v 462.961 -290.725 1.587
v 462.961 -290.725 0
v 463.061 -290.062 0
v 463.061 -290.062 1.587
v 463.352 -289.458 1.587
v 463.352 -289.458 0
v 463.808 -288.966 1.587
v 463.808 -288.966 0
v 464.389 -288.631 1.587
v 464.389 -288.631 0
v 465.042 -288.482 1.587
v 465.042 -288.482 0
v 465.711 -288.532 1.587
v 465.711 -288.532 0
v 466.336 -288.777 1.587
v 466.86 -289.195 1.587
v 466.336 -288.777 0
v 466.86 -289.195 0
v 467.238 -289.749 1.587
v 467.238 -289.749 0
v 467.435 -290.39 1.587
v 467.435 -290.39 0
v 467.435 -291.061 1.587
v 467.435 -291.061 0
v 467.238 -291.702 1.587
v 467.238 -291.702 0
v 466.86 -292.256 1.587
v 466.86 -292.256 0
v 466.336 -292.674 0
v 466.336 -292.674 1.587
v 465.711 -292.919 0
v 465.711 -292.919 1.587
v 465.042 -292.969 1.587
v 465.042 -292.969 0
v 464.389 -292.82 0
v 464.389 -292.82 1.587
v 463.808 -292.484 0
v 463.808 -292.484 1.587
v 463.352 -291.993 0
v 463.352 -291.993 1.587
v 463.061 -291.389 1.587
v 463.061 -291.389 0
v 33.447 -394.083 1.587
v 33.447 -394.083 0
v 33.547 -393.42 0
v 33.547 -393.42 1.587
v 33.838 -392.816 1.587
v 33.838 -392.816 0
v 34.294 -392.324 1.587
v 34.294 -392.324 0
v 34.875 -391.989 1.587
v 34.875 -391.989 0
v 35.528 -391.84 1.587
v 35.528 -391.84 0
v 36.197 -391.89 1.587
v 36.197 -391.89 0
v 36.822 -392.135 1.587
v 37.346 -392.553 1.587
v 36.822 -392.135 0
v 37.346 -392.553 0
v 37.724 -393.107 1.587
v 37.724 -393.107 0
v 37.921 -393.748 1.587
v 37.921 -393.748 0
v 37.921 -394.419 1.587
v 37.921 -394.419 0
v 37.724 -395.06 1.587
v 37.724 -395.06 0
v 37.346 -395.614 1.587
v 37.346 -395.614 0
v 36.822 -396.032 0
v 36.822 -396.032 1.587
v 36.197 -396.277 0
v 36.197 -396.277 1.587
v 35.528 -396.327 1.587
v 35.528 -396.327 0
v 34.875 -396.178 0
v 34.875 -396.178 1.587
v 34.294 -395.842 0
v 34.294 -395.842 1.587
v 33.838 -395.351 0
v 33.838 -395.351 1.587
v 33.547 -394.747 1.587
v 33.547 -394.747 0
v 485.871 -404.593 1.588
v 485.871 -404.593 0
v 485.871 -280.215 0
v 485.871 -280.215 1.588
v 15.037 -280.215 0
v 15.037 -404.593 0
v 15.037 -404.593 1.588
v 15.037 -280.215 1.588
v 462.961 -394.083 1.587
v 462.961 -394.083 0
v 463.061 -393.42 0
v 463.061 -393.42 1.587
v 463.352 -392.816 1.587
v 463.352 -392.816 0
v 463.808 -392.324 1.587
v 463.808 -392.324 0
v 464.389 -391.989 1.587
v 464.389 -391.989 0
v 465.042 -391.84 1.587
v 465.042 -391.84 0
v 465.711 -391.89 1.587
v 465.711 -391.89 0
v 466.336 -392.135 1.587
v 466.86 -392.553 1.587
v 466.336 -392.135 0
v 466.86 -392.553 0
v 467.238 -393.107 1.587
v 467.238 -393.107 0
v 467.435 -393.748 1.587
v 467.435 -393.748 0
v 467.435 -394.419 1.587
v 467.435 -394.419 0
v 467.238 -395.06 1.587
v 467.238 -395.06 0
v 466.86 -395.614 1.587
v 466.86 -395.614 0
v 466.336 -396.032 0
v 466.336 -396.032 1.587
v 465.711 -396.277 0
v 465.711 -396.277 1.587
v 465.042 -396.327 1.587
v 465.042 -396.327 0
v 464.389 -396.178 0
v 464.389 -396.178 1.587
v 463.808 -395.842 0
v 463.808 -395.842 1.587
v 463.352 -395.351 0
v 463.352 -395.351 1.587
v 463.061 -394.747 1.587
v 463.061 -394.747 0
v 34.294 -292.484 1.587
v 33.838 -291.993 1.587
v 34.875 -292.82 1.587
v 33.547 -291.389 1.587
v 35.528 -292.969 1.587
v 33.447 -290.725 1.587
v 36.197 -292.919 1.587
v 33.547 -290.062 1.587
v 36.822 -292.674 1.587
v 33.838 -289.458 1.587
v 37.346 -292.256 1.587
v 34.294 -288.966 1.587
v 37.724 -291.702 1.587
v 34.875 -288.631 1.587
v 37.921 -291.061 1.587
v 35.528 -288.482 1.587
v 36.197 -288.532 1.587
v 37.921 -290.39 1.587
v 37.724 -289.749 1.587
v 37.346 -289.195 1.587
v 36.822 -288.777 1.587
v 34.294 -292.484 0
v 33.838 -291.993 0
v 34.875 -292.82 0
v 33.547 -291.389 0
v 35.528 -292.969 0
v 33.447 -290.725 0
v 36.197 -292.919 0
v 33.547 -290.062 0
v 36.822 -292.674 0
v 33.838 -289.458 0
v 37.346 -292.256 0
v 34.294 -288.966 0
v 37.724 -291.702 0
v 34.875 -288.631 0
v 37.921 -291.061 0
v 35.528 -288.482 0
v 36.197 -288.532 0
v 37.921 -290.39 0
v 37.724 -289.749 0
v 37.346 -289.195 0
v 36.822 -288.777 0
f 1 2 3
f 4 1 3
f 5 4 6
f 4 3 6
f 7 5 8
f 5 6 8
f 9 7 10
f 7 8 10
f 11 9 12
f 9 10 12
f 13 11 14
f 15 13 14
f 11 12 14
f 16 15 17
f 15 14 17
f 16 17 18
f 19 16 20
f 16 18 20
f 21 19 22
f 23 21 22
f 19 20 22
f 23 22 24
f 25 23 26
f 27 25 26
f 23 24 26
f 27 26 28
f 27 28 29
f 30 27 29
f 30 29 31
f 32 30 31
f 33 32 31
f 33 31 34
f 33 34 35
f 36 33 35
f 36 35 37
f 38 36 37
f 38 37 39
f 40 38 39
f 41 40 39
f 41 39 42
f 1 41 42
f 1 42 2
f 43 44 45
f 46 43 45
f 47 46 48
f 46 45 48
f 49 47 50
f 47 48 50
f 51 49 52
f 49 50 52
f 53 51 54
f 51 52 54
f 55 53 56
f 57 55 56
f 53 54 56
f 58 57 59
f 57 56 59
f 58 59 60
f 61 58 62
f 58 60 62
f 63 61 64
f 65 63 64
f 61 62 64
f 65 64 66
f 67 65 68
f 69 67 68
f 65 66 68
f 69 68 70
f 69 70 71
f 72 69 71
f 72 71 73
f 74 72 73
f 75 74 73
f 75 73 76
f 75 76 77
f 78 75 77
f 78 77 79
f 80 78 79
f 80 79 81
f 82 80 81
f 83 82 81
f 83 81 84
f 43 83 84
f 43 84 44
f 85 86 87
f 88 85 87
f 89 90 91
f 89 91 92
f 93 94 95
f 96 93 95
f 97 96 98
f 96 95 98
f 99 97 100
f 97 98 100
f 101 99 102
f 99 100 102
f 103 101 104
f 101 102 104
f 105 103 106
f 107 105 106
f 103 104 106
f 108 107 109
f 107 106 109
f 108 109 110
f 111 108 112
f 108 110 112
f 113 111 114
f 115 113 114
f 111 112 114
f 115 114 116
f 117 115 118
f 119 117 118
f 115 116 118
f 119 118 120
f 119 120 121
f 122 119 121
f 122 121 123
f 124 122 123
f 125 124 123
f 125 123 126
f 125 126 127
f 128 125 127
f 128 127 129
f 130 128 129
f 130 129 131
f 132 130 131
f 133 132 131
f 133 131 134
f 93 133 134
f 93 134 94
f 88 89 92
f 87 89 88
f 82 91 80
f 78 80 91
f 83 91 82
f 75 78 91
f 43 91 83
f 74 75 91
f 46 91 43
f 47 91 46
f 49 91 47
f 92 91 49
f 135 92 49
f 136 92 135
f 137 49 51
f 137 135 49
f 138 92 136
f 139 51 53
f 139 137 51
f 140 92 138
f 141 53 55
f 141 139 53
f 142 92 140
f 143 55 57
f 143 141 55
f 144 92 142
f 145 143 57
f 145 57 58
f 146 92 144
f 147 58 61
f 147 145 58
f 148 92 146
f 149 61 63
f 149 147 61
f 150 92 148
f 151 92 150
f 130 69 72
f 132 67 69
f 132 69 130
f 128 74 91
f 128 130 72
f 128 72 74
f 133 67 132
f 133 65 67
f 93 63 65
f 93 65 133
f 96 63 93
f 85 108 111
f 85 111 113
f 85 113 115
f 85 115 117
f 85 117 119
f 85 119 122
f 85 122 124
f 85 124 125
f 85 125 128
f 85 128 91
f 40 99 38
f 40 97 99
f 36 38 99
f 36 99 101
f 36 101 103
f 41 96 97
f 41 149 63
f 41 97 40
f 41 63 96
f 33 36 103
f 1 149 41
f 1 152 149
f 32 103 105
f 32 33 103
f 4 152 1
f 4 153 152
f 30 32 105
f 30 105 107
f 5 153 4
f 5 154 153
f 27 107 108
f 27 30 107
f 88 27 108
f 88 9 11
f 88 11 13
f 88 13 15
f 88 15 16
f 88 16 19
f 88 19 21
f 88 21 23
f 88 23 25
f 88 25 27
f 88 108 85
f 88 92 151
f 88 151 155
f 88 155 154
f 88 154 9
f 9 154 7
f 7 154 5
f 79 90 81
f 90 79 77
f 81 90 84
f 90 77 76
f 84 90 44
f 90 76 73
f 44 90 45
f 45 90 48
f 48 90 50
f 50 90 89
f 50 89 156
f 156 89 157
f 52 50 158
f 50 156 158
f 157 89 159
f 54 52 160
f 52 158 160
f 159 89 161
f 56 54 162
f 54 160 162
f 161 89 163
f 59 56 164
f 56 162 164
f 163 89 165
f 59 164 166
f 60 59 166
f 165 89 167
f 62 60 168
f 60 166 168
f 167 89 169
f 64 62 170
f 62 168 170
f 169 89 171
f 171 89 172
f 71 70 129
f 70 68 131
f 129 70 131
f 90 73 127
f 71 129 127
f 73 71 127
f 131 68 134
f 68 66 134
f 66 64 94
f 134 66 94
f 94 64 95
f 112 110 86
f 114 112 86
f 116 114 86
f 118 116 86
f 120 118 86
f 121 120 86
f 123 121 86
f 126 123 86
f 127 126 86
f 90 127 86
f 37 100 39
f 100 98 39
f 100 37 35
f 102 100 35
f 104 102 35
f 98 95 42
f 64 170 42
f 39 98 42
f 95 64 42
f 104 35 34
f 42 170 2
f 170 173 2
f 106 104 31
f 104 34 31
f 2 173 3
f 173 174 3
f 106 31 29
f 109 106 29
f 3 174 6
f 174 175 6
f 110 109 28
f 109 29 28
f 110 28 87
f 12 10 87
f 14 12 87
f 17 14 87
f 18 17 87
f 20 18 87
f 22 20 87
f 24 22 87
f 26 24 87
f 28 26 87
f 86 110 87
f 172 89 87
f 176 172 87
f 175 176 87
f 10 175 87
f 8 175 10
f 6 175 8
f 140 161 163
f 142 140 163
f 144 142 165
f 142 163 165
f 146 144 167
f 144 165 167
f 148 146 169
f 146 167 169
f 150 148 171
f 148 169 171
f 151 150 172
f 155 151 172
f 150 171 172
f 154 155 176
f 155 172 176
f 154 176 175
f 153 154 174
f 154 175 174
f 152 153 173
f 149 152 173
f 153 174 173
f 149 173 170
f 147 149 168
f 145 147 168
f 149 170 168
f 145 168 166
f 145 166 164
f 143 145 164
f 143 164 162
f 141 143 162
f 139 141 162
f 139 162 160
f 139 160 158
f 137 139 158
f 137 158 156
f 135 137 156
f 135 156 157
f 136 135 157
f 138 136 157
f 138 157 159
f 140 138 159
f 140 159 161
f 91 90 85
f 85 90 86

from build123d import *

# Parameters (mm, degrees)
SKETCH1_W            = 470.834
SKETCH1_H            = 124.378
SKETCH1_R            = 1.349174791
SKETCH1_R_2          = 1.283013689
SKETCH1_R_3          = 1.369737485
SKETCH1_R_4          = 1.484366509
BOSS_EXTRUDE1_DEPTH  = 1.5875
M4_CLEARANCE_HOLE1_D = 4.5


with BuildPart() as part:
    # Sketch1 → Boss-Extrude1 (new body)
    with BuildSketch(Plane.XY):
        with Locations((250.453582273, -342.404352818)):
            Rectangle(SKETCH1_W, SKETCH1_H)
        with Locations((465.210582273, -290.725352818)):
            Circle(SKETCH1_R, mode=Mode.SUBTRACT)
        with Locations((465.210582273, -394.083352818)):
            Circle(SKETCH1_R_2, mode=Mode.SUBTRACT)
        with Locations((35.696582273, -290.725352818)):
            Circle(SKETCH1_R_3, mode=Mode.SUBTRACT)
        with Locations((35.696582273, -394.083352818)):
            Circle(SKETCH1_R_4, mode=Mode.SUBTRACT)
    extrude(amount=BOSS_EXTRUDE1_DEPTH)

    # M4 Clearance Hole1 (through all)
    with Locations(Plane.XY.offset(1.5875)):
        with Locations((35.696582273, -290.725352818), (35.696582273, -394.083352818), (465.210582273, -290.725352818), (465.210582273, -394.083352818)):
            Hole(M4_CLEARANCE_HOLE1_D / 2)


solid = part.part
